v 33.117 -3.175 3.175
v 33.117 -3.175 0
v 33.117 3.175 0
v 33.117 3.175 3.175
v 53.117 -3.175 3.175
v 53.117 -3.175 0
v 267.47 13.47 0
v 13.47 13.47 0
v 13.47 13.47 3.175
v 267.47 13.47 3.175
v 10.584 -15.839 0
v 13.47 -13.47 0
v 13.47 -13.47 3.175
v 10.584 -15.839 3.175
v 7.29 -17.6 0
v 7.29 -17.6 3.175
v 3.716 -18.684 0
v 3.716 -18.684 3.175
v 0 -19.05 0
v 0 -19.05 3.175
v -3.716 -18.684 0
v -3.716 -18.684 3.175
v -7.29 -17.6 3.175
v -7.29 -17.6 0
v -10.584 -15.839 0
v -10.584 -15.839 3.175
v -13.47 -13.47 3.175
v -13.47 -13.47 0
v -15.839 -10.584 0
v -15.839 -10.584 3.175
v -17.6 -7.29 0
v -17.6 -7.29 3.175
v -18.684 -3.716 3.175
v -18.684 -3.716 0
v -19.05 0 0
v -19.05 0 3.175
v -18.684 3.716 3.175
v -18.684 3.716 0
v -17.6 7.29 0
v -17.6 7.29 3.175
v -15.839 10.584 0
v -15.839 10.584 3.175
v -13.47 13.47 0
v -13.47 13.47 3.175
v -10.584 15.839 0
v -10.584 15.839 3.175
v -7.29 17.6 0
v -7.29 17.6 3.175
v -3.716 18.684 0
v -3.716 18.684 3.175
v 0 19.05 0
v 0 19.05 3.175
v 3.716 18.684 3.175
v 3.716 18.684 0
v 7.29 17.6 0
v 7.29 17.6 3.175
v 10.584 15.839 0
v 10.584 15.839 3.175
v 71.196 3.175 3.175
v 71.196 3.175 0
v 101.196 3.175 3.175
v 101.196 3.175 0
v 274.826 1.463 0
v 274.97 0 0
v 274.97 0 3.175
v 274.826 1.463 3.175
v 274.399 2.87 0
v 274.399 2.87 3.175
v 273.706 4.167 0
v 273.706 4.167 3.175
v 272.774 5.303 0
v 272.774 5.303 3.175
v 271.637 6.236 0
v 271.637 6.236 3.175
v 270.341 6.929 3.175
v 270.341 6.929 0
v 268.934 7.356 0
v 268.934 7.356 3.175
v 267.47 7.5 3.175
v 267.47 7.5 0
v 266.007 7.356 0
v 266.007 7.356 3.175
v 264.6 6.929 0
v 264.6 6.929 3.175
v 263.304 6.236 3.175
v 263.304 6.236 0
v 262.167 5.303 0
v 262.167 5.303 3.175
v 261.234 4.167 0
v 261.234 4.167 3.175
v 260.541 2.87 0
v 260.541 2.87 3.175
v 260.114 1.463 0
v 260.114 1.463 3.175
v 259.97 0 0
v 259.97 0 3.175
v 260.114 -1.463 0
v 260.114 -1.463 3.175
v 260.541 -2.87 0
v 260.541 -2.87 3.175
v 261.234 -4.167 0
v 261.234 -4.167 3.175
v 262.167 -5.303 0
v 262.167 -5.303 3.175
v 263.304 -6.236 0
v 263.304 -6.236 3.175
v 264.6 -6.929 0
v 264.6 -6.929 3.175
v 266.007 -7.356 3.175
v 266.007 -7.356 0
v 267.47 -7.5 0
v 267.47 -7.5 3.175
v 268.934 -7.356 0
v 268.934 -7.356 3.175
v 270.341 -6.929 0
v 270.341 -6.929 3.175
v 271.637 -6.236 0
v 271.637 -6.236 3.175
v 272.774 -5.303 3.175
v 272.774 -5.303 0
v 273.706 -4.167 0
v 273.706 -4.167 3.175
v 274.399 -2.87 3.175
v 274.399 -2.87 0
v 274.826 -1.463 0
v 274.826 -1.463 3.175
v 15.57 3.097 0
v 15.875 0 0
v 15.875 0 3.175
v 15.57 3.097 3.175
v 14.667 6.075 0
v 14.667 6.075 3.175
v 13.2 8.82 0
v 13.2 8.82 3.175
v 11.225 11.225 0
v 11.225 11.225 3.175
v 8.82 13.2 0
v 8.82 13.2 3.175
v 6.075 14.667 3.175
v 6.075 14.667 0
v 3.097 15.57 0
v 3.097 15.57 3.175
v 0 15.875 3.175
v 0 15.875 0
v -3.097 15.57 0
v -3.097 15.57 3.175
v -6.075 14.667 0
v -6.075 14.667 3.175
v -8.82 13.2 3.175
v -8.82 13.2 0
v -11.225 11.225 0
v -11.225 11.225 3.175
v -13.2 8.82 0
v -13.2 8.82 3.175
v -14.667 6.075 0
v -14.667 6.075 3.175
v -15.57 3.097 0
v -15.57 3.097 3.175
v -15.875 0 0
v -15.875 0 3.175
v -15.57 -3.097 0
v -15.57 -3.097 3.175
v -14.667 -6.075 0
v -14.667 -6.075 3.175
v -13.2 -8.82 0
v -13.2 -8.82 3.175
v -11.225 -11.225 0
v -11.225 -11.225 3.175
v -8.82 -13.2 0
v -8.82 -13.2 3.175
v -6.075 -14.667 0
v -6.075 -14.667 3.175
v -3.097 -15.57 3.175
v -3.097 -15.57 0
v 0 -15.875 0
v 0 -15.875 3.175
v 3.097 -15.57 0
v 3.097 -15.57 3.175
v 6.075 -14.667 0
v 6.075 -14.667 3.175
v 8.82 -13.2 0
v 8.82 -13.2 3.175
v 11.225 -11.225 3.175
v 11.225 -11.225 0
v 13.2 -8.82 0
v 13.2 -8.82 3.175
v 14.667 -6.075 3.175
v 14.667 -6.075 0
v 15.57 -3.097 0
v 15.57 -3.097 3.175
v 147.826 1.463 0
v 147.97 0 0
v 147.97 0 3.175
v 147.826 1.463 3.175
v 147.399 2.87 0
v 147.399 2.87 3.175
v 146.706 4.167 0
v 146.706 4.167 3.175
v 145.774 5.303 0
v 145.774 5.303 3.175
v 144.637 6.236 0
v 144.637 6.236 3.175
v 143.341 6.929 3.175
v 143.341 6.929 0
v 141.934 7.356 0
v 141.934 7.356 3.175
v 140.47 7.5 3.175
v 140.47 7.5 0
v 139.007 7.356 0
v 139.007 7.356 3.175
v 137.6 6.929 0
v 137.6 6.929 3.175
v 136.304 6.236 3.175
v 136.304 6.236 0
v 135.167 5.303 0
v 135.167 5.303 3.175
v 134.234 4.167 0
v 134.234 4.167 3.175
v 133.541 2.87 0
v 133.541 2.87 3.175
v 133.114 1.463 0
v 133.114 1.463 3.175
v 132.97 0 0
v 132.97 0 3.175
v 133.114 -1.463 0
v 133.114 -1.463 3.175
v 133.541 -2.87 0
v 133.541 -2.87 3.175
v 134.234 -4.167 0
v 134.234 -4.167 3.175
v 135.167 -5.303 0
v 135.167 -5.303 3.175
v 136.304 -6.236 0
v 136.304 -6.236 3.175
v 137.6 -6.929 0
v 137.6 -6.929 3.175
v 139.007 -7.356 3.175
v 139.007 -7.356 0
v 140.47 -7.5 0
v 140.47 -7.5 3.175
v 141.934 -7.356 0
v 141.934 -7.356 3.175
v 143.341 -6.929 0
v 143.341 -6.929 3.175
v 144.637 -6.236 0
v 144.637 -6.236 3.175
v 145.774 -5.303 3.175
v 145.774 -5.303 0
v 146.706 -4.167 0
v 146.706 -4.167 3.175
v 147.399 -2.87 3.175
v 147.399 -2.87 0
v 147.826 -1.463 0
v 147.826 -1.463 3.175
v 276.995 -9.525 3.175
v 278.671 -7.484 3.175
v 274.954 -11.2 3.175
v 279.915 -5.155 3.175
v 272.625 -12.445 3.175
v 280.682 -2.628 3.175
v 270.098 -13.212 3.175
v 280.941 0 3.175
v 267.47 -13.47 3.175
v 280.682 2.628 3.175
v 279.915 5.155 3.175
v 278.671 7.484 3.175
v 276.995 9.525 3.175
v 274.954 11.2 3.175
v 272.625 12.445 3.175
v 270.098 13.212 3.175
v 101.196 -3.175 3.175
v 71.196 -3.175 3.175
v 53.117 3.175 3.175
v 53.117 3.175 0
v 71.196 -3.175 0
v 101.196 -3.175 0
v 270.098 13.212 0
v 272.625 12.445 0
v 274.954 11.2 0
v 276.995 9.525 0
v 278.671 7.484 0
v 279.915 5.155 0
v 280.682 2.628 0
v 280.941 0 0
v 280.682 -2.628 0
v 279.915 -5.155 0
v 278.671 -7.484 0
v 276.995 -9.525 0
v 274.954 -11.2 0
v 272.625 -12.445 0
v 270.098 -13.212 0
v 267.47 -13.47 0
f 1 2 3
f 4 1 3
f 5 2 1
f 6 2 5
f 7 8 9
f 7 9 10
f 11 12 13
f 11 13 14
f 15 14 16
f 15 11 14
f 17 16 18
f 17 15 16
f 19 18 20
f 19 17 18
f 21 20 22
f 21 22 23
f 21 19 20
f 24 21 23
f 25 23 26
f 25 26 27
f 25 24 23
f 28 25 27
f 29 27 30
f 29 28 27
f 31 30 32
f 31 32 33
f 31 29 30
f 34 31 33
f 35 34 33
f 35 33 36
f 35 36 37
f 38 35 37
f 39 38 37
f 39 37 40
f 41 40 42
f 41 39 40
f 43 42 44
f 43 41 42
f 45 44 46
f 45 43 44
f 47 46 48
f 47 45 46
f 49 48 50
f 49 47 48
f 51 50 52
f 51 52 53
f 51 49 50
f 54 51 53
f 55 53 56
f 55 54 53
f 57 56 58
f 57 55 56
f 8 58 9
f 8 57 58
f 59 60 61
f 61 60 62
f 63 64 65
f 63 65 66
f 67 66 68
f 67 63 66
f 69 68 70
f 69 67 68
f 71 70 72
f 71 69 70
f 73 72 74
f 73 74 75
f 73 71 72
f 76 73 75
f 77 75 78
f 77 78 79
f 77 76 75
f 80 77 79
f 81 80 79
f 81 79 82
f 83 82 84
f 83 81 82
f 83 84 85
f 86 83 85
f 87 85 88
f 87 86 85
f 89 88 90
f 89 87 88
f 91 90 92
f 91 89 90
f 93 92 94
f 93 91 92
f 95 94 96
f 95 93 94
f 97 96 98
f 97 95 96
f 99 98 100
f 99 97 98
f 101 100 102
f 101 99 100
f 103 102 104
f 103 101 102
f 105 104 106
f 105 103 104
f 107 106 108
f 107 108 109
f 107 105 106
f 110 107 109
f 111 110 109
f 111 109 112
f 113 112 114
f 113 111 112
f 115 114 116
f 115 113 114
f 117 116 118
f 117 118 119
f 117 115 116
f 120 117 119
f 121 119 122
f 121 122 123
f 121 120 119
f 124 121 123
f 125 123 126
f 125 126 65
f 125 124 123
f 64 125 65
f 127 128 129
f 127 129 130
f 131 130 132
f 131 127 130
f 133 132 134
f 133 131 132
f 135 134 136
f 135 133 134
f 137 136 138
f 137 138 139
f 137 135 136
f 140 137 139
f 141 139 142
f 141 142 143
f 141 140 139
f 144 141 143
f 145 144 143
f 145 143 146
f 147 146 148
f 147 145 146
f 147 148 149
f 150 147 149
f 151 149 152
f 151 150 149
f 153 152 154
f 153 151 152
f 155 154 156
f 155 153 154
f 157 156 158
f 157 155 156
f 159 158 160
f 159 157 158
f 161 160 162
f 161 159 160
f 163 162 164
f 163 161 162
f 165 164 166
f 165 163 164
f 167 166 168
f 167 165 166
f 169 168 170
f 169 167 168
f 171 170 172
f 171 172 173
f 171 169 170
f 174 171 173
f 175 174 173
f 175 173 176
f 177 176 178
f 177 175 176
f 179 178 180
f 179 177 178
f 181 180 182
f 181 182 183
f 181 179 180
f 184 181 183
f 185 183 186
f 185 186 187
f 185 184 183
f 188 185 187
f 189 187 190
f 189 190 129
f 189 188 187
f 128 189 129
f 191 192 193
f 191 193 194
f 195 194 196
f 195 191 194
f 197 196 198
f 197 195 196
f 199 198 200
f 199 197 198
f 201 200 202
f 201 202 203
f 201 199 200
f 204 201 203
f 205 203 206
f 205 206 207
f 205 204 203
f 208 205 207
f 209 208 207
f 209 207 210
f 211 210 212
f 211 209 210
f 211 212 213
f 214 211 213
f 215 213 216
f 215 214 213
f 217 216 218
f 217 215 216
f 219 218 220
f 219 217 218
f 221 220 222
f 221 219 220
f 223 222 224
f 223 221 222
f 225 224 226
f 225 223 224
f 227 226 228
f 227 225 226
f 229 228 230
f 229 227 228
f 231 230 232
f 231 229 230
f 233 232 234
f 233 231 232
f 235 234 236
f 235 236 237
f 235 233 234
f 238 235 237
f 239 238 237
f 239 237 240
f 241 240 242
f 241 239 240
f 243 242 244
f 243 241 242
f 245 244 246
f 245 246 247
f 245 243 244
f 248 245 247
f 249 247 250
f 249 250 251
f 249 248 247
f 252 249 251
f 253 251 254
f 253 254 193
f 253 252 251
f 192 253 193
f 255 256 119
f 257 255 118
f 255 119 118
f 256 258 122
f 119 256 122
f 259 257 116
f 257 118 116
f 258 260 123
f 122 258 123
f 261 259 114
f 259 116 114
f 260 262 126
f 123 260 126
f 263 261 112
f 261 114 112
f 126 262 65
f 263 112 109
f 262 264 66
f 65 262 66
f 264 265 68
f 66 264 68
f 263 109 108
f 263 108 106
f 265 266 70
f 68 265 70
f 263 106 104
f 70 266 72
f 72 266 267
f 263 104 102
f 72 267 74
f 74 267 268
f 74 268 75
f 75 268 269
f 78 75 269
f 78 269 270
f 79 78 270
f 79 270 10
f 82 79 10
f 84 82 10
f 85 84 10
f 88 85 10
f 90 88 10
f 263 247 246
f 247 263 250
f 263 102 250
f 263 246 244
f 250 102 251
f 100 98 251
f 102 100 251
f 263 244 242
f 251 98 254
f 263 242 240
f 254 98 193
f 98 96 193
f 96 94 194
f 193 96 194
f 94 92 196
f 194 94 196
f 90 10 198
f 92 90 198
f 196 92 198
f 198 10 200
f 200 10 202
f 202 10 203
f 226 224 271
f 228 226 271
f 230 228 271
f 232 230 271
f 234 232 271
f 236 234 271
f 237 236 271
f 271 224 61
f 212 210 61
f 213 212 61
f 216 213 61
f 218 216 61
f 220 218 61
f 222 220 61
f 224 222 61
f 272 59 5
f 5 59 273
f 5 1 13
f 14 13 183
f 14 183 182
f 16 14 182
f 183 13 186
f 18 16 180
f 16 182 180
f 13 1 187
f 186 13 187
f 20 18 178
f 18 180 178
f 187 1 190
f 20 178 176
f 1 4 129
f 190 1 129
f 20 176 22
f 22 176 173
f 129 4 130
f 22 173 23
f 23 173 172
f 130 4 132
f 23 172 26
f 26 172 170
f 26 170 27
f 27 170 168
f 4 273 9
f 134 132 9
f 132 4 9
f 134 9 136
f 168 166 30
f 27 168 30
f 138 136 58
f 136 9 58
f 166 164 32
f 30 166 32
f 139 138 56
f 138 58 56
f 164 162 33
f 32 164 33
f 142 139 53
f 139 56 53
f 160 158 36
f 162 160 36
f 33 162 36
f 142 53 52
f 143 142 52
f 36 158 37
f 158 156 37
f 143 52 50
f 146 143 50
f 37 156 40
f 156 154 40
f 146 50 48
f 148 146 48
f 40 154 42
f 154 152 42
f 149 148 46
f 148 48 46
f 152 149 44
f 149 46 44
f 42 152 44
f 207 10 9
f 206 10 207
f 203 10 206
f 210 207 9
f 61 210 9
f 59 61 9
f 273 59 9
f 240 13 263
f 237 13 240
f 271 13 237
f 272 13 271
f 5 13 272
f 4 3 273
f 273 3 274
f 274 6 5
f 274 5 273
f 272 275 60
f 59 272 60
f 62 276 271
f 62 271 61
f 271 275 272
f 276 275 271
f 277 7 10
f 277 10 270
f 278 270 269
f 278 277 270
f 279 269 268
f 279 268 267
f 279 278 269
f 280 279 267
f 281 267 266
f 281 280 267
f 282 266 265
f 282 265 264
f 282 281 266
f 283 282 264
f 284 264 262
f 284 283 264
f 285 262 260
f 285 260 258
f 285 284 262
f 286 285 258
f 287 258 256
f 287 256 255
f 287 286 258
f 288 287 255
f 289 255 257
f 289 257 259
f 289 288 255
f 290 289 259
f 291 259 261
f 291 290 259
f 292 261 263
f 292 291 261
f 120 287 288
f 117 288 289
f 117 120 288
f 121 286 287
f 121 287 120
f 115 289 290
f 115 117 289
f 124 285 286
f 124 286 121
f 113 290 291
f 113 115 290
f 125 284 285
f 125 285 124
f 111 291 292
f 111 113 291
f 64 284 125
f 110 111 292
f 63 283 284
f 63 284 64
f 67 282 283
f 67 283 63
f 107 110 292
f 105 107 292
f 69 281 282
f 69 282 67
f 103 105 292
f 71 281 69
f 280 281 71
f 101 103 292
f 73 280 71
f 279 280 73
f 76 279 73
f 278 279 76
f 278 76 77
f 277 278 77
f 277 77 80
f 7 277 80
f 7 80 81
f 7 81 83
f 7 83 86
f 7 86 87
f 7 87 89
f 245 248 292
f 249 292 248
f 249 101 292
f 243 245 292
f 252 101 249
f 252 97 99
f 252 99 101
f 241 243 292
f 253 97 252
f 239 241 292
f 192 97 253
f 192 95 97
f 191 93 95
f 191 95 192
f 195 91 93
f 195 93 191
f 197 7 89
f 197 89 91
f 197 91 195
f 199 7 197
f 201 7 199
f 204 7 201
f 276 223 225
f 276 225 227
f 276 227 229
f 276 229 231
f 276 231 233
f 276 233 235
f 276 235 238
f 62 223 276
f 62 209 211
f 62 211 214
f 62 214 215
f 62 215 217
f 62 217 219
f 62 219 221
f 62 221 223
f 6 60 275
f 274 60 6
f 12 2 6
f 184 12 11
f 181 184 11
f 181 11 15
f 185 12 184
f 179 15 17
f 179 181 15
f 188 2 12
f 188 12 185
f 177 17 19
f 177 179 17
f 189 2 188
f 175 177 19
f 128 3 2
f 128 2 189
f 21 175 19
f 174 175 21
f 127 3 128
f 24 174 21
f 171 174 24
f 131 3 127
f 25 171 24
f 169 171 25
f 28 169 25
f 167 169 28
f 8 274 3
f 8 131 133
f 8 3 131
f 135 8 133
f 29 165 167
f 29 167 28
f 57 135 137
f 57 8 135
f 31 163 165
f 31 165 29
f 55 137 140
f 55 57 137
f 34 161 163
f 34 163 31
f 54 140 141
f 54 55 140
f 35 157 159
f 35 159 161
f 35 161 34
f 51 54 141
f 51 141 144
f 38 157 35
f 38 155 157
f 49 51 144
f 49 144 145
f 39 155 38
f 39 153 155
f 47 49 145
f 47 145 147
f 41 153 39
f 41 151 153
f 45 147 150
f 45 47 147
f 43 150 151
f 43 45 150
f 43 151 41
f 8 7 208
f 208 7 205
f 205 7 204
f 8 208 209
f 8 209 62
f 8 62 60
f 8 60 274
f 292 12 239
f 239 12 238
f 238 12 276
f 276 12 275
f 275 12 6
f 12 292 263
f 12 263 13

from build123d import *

# Parameters (mm, degrees)
SKETCH1_R           = 15.875
SKETCH1_R_2         = 7.5
SKETCH1_W           = 20
SKETCH1_H           = 6.35
SKETCH1_W_2         = 30
BOSS_EXTRUDE1_DEPTH = 3.175


with BuildPart() as part:
    # Sketch1 → Boss-Extrude1 (new body)
    with BuildSketch(Plane.XY):
        with BuildLine():
            Line((13.470384182, 13.470384182), (267.470384182, 13.470384182))
            ThreePointArc((267.470384182, 13.470384182), (280.940768363, 0), (267.470384182, -13.470384182))
            Line((267.470384182, -13.470384182), (13.470384182, -13.470384182))
            ThreePointArc((13.470384182, -13.470384182), (-19.05, 0), (13.470384182, 13.470384182))
        make_face()
        Circle(SKETCH1_R, mode=Mode.SUBTRACT)
        with Locations((267.470384182, 0)):
            Circle(SKETCH1_R_2, mode=Mode.SUBTRACT)
        with Locations((140.470384182, 0)):
            Circle(SKETCH1_R_2, mode=Mode.SUBTRACT)
        with Locations((43.11714777, 0)):
            Rectangle(SKETCH1_W, SKETCH1_H, mode=Mode.SUBTRACT)
        with Locations((86.195594821, 0)):
            Rectangle(SKETCH1_W_2, SKETCH1_H, mode=Mode.SUBTRACT)
    extrude(amount=BOSS_EXTRUDE1_DEPTH)


solid = part.part
